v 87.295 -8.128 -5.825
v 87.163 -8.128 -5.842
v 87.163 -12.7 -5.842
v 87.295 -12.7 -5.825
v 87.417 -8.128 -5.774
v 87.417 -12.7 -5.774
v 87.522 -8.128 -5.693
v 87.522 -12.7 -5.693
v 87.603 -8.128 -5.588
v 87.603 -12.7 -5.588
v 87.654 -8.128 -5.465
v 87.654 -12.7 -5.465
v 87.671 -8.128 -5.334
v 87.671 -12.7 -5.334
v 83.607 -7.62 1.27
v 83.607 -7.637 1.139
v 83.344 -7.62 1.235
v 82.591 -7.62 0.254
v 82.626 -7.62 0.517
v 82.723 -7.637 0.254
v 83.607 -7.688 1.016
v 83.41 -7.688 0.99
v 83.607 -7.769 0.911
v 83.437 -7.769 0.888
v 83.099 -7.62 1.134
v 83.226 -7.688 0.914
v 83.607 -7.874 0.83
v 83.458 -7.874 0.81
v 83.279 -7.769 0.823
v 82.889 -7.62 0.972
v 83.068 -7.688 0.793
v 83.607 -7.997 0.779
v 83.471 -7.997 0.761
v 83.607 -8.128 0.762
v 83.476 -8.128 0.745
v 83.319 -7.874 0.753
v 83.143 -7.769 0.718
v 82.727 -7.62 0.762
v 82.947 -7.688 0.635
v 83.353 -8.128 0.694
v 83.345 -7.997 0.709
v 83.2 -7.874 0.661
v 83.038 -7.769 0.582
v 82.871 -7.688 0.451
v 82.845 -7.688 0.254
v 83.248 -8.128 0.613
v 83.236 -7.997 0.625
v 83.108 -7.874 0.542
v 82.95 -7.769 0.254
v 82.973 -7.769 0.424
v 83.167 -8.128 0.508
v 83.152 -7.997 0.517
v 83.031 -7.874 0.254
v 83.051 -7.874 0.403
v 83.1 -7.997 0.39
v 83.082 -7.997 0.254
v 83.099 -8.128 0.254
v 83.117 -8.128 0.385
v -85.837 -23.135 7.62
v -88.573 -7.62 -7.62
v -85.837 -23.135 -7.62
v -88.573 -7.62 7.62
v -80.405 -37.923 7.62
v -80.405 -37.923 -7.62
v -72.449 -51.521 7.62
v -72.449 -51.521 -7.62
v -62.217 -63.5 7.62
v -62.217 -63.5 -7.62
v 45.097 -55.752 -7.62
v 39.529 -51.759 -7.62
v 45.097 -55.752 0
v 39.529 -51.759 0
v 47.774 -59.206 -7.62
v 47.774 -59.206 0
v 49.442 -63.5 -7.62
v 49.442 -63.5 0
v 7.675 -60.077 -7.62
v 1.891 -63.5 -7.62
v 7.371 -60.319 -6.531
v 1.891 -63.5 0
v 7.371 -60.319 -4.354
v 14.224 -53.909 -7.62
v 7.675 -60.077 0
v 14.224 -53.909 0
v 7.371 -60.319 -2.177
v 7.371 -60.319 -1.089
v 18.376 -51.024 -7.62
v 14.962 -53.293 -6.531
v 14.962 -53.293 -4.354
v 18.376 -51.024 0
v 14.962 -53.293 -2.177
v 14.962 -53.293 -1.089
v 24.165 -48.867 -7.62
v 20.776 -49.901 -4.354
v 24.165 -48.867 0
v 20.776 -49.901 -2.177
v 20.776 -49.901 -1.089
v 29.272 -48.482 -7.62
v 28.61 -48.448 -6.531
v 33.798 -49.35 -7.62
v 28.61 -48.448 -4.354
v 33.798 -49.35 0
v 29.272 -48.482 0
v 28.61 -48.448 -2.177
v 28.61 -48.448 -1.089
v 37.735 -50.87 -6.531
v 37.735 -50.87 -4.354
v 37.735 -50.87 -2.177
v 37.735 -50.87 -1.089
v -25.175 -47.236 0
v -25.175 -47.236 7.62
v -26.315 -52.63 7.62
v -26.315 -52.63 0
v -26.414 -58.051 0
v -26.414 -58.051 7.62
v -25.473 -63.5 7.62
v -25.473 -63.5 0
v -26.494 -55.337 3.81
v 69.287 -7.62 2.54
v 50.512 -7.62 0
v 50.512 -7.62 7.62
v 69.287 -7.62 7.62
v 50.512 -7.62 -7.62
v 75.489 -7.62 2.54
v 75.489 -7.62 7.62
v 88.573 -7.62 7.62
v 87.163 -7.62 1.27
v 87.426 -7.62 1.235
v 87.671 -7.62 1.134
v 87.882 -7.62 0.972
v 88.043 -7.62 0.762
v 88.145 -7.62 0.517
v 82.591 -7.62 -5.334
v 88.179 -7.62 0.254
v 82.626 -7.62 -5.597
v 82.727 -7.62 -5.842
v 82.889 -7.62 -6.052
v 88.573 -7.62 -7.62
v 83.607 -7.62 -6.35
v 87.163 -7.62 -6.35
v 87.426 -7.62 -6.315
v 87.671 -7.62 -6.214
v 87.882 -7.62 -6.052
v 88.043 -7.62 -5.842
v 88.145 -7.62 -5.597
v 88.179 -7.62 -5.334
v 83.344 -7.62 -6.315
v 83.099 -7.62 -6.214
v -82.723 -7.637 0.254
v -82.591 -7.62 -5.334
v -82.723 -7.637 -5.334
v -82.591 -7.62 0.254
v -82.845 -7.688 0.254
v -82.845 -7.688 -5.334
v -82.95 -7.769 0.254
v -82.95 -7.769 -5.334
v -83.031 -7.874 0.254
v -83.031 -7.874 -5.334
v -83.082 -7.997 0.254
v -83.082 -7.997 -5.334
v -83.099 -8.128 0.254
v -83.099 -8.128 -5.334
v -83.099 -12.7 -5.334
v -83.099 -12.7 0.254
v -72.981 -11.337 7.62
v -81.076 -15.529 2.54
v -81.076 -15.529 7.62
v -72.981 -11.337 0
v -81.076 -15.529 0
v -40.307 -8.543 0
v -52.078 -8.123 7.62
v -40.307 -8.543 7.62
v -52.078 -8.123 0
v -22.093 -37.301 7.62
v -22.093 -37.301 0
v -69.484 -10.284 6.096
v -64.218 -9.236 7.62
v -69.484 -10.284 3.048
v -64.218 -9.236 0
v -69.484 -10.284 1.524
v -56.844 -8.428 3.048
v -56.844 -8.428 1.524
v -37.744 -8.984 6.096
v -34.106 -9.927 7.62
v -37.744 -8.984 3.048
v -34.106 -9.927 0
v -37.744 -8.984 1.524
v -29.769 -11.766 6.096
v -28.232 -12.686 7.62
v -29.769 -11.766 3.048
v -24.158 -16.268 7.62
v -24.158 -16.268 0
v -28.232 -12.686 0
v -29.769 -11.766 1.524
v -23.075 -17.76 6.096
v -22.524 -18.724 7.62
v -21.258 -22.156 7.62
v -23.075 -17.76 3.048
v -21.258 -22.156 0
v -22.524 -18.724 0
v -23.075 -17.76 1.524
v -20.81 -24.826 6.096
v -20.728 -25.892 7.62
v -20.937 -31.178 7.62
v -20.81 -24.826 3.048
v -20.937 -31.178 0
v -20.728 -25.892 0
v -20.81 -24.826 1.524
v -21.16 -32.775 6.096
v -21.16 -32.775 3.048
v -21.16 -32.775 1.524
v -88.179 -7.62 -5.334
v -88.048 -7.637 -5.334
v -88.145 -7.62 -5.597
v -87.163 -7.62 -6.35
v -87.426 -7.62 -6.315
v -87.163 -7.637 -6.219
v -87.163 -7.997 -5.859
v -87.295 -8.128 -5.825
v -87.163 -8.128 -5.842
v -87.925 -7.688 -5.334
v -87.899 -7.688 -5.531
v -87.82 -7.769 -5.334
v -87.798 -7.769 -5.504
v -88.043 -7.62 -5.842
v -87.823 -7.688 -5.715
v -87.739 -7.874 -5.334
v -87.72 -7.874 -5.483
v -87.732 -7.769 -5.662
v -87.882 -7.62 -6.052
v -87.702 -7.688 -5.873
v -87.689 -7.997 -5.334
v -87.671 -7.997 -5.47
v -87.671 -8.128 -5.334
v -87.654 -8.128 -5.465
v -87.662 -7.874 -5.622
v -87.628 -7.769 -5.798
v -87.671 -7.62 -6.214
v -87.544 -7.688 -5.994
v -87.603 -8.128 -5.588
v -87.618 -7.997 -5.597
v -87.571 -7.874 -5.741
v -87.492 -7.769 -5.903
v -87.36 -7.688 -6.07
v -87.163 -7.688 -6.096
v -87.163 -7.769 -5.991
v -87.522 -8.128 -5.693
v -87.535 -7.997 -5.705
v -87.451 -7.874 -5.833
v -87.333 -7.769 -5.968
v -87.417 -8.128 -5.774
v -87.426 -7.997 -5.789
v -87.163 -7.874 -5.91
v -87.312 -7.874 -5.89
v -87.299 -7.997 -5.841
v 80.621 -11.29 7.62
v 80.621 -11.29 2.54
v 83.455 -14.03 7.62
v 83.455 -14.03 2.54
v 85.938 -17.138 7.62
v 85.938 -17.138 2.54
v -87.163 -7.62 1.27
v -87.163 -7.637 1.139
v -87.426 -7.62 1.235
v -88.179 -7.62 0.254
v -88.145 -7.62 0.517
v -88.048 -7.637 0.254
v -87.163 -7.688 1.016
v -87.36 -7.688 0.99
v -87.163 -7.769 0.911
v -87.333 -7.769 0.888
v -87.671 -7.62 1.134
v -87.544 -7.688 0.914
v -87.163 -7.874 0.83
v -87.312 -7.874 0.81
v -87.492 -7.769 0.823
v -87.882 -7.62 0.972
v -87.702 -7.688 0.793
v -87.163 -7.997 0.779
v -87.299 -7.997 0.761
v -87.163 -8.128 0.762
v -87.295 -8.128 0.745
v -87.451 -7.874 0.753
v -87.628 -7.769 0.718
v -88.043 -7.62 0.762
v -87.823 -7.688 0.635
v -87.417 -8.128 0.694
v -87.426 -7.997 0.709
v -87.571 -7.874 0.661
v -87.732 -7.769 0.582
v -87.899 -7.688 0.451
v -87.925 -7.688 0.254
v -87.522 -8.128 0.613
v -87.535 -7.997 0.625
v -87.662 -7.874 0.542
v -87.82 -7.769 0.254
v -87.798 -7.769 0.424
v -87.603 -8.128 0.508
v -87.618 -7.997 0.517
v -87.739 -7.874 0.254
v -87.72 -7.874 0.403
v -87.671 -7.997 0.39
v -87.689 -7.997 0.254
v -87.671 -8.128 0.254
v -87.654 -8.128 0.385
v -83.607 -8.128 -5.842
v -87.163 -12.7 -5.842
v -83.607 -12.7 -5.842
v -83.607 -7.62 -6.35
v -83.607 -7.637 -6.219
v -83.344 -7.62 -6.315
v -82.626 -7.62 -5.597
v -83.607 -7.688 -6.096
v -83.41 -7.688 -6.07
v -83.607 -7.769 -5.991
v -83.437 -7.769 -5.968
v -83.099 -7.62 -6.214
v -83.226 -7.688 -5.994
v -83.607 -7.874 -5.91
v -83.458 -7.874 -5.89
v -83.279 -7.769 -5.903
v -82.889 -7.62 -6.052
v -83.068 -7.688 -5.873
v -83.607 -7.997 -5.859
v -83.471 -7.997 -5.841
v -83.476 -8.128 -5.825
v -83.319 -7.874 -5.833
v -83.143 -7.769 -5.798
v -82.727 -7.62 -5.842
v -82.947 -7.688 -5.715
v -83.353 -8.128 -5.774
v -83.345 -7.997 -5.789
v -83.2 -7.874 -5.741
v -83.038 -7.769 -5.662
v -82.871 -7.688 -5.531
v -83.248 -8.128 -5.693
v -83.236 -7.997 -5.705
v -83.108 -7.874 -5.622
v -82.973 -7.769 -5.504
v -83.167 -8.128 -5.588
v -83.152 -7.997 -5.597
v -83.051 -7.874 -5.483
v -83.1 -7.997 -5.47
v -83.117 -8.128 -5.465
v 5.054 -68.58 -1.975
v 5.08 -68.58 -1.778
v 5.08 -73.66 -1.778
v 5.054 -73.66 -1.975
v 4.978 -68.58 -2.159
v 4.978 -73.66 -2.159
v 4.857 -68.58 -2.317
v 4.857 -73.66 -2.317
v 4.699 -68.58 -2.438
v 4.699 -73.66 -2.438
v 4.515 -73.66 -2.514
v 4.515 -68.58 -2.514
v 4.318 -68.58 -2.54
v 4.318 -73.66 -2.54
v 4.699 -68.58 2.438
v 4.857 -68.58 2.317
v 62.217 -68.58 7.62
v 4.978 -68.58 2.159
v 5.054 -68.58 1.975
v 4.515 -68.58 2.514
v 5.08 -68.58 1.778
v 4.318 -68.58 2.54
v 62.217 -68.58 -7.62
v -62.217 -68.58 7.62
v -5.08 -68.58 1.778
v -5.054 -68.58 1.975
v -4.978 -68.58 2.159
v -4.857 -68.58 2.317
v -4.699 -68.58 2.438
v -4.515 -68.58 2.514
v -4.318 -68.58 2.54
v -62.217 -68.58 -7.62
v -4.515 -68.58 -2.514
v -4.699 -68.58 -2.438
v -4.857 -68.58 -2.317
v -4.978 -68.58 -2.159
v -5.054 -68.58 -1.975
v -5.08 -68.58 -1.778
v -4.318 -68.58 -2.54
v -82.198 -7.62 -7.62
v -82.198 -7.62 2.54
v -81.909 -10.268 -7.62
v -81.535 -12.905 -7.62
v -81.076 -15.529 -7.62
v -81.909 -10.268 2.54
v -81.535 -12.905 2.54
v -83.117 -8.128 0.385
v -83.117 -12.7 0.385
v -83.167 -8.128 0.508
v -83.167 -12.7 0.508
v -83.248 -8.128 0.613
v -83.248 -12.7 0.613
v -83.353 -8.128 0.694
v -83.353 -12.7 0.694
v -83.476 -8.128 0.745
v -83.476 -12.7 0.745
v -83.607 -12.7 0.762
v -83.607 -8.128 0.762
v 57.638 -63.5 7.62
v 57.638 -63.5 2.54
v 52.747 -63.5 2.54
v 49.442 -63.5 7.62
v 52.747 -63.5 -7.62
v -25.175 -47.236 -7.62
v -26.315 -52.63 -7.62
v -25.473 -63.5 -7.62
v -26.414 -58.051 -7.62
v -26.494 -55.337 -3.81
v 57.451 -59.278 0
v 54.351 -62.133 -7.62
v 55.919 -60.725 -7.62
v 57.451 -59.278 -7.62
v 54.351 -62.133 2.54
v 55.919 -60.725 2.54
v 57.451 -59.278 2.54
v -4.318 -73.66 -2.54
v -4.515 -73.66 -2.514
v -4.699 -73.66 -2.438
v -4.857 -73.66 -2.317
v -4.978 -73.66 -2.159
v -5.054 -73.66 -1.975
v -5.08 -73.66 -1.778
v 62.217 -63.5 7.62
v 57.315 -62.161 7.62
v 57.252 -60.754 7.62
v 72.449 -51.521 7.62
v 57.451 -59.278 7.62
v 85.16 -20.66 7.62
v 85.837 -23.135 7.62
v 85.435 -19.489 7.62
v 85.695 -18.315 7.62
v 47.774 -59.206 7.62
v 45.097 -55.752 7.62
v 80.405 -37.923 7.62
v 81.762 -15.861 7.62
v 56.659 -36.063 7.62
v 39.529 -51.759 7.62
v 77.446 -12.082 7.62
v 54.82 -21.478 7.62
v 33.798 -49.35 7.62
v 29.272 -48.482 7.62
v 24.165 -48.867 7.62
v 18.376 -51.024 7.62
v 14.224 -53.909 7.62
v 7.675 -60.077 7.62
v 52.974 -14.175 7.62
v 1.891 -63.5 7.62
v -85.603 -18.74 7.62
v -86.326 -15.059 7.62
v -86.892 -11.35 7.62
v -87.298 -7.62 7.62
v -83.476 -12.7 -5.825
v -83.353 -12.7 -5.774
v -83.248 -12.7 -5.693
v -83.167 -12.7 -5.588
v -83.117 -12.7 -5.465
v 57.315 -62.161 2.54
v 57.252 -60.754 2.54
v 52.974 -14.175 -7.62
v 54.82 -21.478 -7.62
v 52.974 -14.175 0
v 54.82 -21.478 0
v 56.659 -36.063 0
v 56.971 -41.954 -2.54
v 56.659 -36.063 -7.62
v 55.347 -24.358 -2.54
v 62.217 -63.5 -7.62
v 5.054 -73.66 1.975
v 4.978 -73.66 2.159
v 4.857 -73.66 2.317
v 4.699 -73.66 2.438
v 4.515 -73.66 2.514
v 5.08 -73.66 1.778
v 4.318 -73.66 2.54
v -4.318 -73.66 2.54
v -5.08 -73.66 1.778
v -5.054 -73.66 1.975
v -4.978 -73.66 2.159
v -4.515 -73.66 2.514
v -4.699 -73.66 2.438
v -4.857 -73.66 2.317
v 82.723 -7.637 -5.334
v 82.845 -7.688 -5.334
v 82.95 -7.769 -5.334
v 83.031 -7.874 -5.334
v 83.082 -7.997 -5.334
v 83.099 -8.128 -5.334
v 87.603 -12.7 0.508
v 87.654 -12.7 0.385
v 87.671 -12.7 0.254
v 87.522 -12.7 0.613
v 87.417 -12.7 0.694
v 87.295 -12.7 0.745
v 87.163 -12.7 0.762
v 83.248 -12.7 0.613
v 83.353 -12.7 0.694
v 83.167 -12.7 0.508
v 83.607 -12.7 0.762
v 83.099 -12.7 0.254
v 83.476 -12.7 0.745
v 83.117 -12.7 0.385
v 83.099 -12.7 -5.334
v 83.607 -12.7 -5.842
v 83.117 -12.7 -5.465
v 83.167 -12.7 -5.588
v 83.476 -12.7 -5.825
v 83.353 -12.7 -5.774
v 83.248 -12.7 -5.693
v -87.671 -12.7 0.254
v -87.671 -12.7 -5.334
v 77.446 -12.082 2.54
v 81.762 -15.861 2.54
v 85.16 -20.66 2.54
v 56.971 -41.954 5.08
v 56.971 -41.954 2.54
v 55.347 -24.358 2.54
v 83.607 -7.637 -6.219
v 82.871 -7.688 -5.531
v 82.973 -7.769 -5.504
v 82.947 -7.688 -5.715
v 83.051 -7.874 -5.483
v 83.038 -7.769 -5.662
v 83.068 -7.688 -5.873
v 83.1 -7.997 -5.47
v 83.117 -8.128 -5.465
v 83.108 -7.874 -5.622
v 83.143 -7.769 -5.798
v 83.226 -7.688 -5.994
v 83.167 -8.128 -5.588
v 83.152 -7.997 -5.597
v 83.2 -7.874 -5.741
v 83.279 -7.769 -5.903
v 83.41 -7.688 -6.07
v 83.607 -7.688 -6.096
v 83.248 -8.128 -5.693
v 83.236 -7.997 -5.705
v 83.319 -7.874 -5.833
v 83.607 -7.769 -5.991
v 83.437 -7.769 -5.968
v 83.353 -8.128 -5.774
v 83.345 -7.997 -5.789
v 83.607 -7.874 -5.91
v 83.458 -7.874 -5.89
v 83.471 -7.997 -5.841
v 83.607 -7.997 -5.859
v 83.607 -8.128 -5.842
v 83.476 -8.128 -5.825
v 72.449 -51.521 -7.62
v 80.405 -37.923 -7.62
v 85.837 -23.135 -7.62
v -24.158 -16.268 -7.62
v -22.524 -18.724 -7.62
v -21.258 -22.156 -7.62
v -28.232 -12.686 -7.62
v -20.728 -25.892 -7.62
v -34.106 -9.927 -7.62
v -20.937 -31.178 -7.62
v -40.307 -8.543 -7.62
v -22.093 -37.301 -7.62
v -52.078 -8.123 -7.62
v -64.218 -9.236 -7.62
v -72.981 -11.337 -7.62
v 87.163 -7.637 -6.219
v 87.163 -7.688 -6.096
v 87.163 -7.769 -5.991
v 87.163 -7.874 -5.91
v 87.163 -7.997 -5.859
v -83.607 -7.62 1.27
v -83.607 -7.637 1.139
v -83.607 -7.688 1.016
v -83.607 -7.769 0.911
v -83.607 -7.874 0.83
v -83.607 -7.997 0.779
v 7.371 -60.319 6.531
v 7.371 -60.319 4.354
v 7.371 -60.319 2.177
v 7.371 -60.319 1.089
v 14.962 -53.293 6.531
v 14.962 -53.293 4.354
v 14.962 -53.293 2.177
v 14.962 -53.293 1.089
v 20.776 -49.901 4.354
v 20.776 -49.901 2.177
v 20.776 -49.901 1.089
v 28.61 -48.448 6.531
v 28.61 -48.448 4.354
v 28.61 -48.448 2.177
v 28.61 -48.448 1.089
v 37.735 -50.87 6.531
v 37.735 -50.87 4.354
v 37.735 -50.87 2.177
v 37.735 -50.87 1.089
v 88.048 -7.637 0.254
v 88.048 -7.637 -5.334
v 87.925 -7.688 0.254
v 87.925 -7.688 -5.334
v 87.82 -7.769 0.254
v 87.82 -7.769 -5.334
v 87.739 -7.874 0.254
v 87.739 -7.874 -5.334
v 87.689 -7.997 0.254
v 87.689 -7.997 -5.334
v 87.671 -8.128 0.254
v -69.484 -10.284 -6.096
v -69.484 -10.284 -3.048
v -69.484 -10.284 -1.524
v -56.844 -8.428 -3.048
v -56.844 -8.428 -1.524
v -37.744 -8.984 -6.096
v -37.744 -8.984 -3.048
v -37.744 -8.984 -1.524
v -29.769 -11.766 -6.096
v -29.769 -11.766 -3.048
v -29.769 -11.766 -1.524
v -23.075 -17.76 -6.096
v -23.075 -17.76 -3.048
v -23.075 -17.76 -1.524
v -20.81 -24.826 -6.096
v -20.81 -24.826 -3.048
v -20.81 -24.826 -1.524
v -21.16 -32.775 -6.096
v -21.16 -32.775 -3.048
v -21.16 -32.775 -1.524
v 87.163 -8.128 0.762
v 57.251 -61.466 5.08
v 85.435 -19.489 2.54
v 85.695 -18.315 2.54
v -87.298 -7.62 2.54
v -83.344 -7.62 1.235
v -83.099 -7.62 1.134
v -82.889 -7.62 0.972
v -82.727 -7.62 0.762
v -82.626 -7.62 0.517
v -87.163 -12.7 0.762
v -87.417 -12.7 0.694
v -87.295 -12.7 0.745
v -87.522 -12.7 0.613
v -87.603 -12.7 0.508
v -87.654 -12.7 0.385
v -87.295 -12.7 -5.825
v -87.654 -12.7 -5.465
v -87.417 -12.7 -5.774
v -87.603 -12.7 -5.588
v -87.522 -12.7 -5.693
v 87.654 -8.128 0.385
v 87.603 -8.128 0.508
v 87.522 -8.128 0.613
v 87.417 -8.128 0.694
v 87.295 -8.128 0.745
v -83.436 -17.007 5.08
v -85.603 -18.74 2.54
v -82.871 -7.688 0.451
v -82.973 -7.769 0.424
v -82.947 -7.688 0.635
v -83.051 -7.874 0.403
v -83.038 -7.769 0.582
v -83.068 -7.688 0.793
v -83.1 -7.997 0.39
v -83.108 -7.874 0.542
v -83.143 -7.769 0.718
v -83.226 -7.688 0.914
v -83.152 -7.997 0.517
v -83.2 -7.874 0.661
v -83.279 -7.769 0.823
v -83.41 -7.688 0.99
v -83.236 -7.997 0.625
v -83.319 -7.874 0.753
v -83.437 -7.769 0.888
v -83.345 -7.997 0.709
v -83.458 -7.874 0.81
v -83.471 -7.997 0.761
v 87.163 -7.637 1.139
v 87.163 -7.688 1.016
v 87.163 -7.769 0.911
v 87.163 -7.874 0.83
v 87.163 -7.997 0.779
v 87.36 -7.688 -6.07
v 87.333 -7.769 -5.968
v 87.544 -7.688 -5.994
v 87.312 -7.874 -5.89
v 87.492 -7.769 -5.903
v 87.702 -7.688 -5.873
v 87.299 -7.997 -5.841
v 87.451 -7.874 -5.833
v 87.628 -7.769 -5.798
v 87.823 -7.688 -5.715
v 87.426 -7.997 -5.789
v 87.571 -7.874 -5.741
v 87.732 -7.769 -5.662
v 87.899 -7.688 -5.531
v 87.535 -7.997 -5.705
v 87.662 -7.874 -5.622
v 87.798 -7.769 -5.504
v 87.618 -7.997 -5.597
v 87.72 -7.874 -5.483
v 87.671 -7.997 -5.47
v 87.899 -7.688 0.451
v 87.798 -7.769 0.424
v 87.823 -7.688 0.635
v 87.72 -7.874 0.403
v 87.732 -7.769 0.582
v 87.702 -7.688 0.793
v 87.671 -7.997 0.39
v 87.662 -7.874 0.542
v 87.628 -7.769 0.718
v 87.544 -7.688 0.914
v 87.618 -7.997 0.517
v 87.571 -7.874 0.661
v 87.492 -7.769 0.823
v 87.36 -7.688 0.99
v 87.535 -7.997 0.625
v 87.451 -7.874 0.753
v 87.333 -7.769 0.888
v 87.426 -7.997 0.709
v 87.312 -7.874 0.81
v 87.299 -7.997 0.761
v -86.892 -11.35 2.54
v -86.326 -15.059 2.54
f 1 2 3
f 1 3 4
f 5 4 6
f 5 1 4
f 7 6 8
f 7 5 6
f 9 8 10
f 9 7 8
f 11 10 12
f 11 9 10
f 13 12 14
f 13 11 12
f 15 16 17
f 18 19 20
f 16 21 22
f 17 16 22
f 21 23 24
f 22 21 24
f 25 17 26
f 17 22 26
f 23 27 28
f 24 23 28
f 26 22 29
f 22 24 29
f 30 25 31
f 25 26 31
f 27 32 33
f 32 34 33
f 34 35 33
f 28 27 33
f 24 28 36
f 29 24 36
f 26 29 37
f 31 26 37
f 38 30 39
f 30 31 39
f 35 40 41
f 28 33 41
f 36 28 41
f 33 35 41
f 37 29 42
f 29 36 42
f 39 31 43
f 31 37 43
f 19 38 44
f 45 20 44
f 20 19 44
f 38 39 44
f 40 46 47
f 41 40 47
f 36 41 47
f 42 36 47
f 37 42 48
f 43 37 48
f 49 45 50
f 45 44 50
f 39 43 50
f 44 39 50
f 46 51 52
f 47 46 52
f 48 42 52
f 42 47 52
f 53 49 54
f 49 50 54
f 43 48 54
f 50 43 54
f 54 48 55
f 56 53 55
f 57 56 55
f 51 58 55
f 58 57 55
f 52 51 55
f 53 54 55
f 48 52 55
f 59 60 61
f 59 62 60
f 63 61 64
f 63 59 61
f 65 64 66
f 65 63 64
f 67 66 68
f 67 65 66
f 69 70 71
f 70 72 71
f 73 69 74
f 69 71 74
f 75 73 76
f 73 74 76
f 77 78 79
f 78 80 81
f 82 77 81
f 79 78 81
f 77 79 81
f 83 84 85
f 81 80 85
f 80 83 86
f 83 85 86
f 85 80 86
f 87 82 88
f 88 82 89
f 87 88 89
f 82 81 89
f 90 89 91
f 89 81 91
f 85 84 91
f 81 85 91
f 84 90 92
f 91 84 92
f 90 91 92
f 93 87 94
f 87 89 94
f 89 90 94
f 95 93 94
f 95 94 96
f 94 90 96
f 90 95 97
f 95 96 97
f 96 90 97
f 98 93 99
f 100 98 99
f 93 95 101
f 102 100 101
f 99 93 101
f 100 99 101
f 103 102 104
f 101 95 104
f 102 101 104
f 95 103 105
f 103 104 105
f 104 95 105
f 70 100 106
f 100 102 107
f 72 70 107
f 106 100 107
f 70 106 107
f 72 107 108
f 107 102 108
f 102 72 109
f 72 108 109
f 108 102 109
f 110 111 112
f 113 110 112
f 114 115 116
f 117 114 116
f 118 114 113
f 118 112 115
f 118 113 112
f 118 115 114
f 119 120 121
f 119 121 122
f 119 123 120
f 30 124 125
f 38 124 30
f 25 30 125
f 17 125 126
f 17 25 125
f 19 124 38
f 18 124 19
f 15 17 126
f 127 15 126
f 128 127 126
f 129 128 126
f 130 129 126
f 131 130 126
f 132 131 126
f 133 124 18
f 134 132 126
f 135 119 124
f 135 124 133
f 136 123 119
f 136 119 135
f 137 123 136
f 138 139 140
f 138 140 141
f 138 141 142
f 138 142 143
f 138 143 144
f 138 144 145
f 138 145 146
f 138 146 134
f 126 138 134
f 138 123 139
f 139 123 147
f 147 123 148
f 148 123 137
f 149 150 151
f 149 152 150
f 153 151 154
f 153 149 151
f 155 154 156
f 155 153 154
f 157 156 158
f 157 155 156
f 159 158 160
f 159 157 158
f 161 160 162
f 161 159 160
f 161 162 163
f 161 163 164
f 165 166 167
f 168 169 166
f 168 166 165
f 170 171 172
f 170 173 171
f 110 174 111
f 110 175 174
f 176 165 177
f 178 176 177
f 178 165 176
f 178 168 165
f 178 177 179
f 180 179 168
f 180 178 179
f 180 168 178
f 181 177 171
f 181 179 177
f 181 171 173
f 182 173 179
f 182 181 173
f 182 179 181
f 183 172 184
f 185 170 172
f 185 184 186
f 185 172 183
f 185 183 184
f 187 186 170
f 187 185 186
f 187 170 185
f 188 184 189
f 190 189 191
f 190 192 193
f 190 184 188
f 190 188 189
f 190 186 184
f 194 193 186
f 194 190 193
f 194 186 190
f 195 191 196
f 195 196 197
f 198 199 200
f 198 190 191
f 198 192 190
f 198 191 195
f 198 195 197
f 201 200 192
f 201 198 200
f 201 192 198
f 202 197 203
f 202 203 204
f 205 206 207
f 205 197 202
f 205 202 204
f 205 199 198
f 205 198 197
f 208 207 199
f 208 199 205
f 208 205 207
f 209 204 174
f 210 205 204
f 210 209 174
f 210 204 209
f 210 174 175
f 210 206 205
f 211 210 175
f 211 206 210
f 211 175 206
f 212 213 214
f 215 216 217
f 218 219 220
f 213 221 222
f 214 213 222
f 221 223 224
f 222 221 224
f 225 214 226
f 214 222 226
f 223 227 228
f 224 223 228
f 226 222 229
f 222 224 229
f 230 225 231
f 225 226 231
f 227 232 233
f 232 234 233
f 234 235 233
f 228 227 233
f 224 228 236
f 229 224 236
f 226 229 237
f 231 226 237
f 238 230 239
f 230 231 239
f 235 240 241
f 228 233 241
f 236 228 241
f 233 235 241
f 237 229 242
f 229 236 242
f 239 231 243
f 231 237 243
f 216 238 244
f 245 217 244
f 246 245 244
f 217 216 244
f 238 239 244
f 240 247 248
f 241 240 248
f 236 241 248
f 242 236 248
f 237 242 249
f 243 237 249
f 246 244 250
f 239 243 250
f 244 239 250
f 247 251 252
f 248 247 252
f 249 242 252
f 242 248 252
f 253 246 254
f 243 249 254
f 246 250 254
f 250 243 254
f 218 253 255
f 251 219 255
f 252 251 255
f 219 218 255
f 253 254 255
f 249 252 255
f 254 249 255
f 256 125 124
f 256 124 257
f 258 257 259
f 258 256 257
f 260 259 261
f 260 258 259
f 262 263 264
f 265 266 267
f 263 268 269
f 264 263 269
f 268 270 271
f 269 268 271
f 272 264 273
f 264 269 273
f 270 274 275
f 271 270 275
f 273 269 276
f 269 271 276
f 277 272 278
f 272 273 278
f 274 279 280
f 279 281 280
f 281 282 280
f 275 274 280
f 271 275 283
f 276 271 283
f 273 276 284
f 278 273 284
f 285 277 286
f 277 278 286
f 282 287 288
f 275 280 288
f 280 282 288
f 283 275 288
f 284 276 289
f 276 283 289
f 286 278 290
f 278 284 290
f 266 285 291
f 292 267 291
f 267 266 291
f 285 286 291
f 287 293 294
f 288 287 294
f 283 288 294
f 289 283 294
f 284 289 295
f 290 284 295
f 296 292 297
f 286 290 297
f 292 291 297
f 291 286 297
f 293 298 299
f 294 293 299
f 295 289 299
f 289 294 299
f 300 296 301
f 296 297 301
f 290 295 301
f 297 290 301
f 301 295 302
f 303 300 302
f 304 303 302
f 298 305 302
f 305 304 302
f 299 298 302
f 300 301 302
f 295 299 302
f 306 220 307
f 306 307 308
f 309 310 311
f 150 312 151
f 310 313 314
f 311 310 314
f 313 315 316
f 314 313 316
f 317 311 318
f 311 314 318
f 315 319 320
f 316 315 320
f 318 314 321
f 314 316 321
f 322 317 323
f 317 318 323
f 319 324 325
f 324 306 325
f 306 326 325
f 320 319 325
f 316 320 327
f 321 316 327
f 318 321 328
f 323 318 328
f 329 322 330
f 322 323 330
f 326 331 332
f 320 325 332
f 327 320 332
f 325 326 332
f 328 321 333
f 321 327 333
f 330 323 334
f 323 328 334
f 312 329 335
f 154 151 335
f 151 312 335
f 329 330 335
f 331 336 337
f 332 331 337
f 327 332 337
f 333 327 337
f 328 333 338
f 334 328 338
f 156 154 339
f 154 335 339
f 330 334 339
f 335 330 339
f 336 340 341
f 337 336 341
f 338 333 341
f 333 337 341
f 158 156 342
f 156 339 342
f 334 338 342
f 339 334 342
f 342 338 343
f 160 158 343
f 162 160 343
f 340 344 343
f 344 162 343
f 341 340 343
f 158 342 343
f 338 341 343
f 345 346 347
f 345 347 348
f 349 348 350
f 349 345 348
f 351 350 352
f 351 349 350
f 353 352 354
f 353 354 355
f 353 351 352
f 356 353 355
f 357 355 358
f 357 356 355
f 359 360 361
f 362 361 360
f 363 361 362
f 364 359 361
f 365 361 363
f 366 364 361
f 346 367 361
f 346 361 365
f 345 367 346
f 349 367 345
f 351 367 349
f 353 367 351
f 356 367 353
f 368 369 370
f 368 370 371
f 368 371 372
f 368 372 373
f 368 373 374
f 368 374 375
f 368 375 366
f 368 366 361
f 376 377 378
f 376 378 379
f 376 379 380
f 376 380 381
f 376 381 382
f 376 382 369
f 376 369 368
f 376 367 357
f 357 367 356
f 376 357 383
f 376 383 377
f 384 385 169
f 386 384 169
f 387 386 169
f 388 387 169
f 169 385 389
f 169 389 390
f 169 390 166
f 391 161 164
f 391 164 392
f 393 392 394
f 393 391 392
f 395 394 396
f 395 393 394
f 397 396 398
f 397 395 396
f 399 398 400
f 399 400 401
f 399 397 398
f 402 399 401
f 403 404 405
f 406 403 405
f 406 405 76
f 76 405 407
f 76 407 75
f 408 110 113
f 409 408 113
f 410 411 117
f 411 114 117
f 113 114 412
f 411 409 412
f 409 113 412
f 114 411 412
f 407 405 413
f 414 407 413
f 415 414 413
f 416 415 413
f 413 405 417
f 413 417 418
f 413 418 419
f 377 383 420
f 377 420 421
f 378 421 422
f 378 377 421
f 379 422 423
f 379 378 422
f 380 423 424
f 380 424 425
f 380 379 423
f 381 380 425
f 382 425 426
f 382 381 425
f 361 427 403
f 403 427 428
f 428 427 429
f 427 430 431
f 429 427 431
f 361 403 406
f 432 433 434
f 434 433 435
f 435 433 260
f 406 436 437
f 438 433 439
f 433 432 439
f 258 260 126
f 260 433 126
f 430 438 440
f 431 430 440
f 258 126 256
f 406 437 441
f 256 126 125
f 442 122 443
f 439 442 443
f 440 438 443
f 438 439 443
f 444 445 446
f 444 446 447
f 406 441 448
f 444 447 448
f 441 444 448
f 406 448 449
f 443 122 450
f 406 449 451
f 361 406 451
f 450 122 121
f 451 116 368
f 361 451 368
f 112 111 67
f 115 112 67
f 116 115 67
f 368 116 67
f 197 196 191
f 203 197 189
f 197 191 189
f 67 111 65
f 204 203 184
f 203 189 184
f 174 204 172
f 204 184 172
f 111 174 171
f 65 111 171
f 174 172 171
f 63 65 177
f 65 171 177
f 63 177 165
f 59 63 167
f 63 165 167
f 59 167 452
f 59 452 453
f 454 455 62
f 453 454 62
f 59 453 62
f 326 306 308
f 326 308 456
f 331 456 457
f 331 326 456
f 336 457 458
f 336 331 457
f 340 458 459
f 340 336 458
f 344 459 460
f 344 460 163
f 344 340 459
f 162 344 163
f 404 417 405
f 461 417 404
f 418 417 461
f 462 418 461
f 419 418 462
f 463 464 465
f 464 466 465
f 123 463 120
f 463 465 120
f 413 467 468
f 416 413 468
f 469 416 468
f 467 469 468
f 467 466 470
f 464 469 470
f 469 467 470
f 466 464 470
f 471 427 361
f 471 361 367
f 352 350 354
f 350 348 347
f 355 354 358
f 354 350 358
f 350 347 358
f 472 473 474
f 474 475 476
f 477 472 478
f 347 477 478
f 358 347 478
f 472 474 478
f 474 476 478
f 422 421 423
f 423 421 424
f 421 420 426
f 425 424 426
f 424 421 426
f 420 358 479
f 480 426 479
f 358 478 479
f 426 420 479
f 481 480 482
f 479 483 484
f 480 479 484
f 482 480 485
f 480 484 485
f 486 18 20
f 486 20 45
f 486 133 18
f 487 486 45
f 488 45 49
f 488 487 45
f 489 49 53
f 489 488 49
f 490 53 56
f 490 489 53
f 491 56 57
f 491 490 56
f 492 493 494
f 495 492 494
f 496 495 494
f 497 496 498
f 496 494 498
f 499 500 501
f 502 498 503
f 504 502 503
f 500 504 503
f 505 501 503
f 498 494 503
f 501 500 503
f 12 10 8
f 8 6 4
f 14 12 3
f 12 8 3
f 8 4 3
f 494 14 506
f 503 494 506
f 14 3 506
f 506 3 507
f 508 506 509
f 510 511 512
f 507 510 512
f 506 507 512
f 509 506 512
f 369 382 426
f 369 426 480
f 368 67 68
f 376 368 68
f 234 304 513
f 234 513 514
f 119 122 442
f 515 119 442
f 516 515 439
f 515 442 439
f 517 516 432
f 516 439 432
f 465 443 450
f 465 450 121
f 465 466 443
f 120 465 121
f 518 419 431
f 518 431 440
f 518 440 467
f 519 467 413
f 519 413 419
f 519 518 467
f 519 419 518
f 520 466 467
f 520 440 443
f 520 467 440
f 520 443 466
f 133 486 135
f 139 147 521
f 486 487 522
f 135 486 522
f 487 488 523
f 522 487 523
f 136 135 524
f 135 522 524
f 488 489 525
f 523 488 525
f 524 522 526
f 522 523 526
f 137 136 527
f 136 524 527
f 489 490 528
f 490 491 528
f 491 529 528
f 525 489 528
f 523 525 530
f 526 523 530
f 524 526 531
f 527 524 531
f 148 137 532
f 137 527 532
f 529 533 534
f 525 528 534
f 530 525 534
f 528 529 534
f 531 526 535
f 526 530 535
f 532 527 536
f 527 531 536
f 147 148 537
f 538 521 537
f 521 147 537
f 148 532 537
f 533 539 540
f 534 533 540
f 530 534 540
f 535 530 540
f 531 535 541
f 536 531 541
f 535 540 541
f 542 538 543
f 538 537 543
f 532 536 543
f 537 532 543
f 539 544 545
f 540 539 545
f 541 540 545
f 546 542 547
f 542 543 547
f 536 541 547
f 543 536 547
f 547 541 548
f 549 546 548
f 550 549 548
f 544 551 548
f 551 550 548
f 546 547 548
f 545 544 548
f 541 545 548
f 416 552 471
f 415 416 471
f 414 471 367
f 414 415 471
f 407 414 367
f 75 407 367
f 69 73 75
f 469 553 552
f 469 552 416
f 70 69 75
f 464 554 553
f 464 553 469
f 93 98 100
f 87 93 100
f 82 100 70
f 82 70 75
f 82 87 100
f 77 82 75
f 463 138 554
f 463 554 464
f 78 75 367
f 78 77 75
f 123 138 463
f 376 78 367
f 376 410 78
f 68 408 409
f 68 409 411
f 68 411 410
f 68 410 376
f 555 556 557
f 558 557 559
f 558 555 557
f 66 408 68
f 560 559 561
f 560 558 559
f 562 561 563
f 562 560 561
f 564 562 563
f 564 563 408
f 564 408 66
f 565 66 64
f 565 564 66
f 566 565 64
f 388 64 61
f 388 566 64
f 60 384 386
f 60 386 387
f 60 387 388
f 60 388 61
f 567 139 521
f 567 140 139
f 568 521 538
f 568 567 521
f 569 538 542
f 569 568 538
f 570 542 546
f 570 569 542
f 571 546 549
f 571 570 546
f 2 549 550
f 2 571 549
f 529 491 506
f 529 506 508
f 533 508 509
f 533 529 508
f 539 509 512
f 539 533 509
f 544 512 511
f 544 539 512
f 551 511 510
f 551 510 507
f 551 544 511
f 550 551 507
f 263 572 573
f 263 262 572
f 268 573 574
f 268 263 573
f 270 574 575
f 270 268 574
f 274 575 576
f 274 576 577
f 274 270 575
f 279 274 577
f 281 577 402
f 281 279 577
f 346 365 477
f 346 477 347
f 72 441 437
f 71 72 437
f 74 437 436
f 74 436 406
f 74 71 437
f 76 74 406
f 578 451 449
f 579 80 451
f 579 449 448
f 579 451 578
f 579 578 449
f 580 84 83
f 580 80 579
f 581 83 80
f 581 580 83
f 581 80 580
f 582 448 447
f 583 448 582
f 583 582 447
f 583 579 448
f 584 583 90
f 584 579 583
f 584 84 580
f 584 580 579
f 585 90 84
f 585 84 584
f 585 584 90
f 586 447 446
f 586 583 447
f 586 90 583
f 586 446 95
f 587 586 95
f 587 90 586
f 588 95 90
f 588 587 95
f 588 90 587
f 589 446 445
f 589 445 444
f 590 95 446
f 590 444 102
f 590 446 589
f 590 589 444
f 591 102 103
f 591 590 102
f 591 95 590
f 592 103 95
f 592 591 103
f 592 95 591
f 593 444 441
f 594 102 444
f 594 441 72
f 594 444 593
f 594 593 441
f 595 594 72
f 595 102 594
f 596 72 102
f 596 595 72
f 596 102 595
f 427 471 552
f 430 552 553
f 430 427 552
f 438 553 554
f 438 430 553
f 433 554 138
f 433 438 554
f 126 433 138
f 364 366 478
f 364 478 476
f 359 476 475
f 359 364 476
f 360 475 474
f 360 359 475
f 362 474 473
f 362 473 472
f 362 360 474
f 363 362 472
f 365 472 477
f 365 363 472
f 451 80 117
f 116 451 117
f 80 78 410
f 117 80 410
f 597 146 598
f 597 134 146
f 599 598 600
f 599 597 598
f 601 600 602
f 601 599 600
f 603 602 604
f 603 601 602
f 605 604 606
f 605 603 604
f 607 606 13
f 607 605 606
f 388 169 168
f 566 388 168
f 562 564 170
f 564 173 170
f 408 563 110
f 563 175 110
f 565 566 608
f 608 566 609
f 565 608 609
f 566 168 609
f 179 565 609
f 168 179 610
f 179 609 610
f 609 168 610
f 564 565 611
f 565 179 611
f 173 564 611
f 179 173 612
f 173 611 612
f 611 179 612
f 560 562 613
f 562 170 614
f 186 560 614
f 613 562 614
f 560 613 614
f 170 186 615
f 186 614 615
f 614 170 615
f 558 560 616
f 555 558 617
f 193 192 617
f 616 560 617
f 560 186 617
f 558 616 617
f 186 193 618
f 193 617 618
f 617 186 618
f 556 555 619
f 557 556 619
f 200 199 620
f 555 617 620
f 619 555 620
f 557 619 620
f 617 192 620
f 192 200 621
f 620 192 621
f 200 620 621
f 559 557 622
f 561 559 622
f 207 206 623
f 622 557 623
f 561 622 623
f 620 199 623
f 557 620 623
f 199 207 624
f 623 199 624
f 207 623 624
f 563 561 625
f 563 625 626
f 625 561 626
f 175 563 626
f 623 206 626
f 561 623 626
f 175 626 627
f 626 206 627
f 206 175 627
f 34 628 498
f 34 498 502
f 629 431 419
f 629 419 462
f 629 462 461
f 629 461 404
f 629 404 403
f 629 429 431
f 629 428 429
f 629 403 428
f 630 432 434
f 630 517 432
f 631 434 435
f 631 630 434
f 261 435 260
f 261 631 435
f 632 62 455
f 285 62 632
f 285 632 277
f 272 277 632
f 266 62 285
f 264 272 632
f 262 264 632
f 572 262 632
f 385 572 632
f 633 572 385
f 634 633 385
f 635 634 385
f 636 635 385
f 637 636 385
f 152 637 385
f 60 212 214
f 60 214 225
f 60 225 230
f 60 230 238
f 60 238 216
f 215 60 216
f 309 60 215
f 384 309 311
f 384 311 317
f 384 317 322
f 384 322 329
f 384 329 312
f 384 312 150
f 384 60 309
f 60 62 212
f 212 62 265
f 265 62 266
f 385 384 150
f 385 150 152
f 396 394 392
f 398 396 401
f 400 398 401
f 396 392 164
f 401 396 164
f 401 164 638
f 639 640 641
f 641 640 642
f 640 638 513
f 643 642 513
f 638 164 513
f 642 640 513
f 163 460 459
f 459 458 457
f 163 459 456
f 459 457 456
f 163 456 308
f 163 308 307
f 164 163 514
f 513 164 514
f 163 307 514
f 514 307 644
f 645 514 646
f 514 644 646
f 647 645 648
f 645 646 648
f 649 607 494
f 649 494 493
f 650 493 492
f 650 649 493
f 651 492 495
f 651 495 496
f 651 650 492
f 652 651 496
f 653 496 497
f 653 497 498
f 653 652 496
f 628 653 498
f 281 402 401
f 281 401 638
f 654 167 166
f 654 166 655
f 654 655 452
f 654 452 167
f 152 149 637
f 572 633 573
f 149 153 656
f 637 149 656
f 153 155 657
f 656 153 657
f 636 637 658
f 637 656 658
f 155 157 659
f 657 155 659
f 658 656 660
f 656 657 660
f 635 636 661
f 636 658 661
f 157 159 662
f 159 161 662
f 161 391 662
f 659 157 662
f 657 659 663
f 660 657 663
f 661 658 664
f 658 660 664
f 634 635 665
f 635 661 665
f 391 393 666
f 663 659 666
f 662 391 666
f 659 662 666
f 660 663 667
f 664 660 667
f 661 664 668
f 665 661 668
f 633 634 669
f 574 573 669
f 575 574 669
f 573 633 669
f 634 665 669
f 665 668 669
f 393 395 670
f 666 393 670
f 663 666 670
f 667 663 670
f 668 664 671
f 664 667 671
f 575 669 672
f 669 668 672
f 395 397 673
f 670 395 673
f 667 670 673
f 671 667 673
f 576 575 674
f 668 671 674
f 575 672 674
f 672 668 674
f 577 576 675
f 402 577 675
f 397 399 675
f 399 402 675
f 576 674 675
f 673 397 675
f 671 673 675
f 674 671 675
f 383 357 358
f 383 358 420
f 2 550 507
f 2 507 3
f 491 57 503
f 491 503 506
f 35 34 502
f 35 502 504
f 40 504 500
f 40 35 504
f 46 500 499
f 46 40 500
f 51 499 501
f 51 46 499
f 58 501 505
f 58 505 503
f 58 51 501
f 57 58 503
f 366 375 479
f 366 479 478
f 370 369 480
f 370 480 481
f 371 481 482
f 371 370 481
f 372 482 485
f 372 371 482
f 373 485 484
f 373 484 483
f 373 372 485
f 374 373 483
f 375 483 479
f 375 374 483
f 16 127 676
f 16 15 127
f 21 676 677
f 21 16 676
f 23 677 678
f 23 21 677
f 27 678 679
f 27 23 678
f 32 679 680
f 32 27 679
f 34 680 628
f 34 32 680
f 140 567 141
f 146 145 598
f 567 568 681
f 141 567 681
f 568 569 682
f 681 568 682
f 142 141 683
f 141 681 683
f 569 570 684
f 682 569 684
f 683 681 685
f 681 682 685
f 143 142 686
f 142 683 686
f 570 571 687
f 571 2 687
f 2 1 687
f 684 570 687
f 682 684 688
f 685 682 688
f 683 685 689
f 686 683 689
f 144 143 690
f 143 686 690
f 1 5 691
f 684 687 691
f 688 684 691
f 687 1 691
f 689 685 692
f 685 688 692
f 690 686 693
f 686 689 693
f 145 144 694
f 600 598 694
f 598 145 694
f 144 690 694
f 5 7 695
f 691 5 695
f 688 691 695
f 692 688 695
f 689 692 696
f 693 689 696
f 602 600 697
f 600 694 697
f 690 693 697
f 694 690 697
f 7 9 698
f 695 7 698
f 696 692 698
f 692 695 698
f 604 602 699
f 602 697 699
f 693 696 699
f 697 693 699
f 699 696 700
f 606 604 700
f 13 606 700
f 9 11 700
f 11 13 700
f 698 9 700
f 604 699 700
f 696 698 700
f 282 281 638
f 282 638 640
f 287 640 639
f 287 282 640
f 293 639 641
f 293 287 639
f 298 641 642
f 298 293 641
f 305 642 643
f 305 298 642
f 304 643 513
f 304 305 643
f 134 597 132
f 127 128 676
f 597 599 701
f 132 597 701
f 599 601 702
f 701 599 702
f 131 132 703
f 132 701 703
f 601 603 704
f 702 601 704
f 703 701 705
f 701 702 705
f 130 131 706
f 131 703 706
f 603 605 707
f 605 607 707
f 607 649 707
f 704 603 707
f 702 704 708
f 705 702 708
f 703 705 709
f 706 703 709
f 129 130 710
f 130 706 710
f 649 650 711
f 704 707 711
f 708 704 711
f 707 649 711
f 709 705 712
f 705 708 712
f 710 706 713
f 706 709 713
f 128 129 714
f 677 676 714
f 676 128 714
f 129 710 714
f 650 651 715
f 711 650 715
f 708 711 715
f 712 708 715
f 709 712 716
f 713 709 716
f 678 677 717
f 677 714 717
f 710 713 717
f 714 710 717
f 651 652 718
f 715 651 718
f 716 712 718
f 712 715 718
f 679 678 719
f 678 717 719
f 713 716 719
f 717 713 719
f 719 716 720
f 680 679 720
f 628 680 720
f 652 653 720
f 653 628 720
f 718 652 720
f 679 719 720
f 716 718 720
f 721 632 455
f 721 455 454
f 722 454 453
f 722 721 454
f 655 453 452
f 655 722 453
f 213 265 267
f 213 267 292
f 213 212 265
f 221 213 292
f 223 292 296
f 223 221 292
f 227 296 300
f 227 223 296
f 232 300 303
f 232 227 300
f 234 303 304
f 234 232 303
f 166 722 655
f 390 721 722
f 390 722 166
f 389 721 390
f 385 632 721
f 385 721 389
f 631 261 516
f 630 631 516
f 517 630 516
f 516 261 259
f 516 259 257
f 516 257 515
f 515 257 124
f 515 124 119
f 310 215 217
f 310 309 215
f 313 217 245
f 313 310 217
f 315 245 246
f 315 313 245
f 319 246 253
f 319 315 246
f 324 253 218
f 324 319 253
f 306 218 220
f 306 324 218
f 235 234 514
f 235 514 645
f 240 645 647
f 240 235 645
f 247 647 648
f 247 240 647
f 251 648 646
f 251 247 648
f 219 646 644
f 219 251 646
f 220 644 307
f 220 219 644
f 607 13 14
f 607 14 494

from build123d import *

# Parameters (mm, degrees)
SKETCH2_R           = 88.9
BOSS_EXTRUDE1_DEPTH = 7.62
CUT_EXTRUDE1_DEPTH  = 5.08
CUT_EXTRUDE2_DEPTH  = 5.08
SKETCH6_R           = 88.9
SKETCH6_R_2         = 87.63
BOSS_EXTRUDE2_DEPTH = 7.62
SKETCH5_W           = 447.85569709
SKETCH5_H           = 96.634651294
CUT_EXTRUDE3_DEPTH  = 132.443466321
CUT_EXTRUDE4_DEPTH  = 5.08
FILLET1_R           = 0.508
FILLET2_R           = 0.508
SKETCH8_W           = 235.469737428
SKETCH8_H           = 63.022782664
CUT_EXTRUDE6_DEPTH  = 30.48
SKETCH11_W          = 124.434078934
SKETCH11_H          = 15.24
BOSS_EXTRUDE3_DEPTH = 5.08
BOSS_EXTRUDE4_DEPTH = 5.08


with BuildPart() as part:
    # Sketch2 → Boss-Extrude1 (new, symmetric)
    with BuildSketch(Plane.XY):
        with Locations(Location((0, 0, 0), (0, 0, 180))):
            Circle(SKETCH2_R)
        with BuildLine():
            ThreePointArc((-82.315247566, -6.2211348), (-81.828164186, -10.892843798), (-81.076160162, -15.529286954))
            add(Edge.make_bspline(
                [(-81.076160162, -15.529286954), (-73.906972416, -10.329566502), (-59.046073895, -8.193381199), (-41.118812884, -7.621785306), (-29.401022662, -11.302114845), (-16.402067506, -22.130924736), (-22.534501322, -39.59705785), (-25.174662603, -47.236332112)],
                knots=[0, 0, 0, 0, 0.276571303, 0.483745751, 0.57530858, 0.672728071, 1, 1, 1, 1], degree=3))
            add(Edge.make_bspline(
                [(-25.174662603, -47.236332112), (-27.78260004, -55.688683624), (-25.255419914, -64.276124819)],
                knots=[0, 0, 0, 1, 1, 1], degree=2))
            add(Edge.make_bspline(
                [(-25.255419914, -64.276124819), (-19.568994185, -66.326395956), (-8.191864865, -67.179069199), (6.698062012, -62.452519029), (13.701149455, -53.656480208), (20.991800731, -49.374990358), (29.14906596, -47.7148715), (41.321609726, -51.605604), (49.118683791, -58.056687878), (49.804799161, -65.833004493)],
                knots=[0, 0, 0, 0, 0.203689327, 0.383928899, 0.501194003, 0.577509121, 0.667833303, 0.774874029, 1, 1, 1, 1], degree=3))
            ThreePointArc((49.804799161, -65.833004493), (53.727997634, -62.672200937), (57.451073953, -59.277960505))
            add(Edge.make_bspline(
                [(57.451073953, -59.277960505), (56.756918153, -39.692420945), (57.937164009, -17.253163459), (46.295557994, 0)],
                knots=[0, 0, 0, 0, 1, 1, 1, 1], degree=3))
            add(Edge.make_bspline(
                [(46.295557994, 0), (29.352418178, 2.160827537), (12.476860977, -1.829953153), (-4.097004325, -4.838743622)],
                knots=[0, 0, 0, 0, 1, 1, 1, 1], degree=3))
            add(Edge.make_bspline(
                [(-4.097004325, -4.838743622), (-9.003253572, -4.538646122), (-9.174496671, 2.827576235), (-6.823743398, 13.979544817), (0.460919685, 29.784330466), (13.972068662, 51.572454476), (27.394543454, 67.53561229), (37.735282985, 73.420371274)],
                knots=[0, 0, 0, 0, 0.104628163, 0.200082966, 0.362713634, 0.636377303, 1, 1, 1, 1], degree=3))
            ThreePointArc((37.735282985, 73.420371274), (31.253924322, 76.40480819), (24.539050502, 78.818383011))
            add(Edge.make_bspline(
                [(24.539050502, 78.818383011), (20.455603408, 74.411727836), (17.564971871, 65.824999318), (9.51286746, 57.448673309), (-6.264292968, 43.842012074), (-22.034432487, 67.881542589), (-34.946297284, 64.774058813)],
                knots=[0, 0, 0, 0, 0.241588619, 0.345090174, 0.475626468, 1, 1, 1, 1], degree=3))
            add(Edge.make_bspline(
                [(-34.946297284, 64.774058813), (-40.534107409, 56.654806295), (-49.826434679, 42.328020188), (-53.897482917, 22.922904088), (-55.122078377, 8.697330529), (-64.97763294, -2.490084084), (-73.627608697, -8.872135806), (-82.315247566, -6.2211348)],
                knots=[0, 0, 0, 0, 0.32342158, 0.539679085, 0.642017351, 0.776511597, 1, 1, 1, 1], degree=3))
        make_face(mode=Mode.SUBTRACT)
    extrude(amount=BOSS_EXTRUDE1_DEPTH, both=True)

    # Sketch3 → Cut-Extrude1 (cut)
    with BuildSketch(Plane.XY.offset(7.62)):
        with BuildLine():
            ThreePointArc((45.031224335, -76.651150251), (52.423489091, -71.798243652), (59.297063103, -66.23494778))
            add(Edge.make_bspline(
                [(57.451073953, -59.277960505), (56.590081261, -63.222807516), (59.297063103, -66.23494778)],
                knots=[0, 0, 0, 1, 1, 1], degree=2))
            ThreePointArc((57.451073953, -59.277960505), (53.727997634, -62.672200937), (49.804799161, -65.833004493))
            add(Edge.make_bspline(
                [(49.804799161, -65.833004493), (50.290836256, -72.182369469), (45.031224335, -76.651150251)],
                knots=[0, 0, 0, 1, 1, 1], degree=2))
        make_face()
        with BuildLine():
            ThreePointArc((-88.68252483, 6.214482268), (-88.635767577, -6.849139077), (-86.675026694, -19.764861438))
            add(Edge.make_bspline(
                [(-81.076160162, -15.529286954), (-84.185623479, -17.238401337), (-86.675026694, -19.764861438)],
                knots=[0, 0, 0, 1, 1, 1], degree=2))
            ThreePointArc((-81.076160162, -15.529286954), (-81.828164186, -10.892843798), (-82.315247566, -6.2211348))
            add(Edge.make_bspline(
                [(-82.315247566, -6.2211348), (-88.132024584, -1.499163565), (-88.68252483, 6.214482268)],
                knots=[0, 0, 0, 1, 1, 1], degree=2))
        make_face()
        with BuildLine():
            ThreePointArc((46.295557994, 75.894211308), (38.302929005, 80.22528049), (29.909783679, 83.717470341))
            add(Edge.make_bspline(
                [(24.539050502, 78.818383011), (26.687958515, 81.902861564), (29.909783679, 83.717470341)],
                knots=[0, 0, 0, 1, 1, 1], degree=2))
            ThreePointArc((24.539050502, 78.818383011), (31.253924322, 76.40480819), (37.735282985, 73.420371274))
            add(Edge.make_bspline(
                [(37.735282985, 73.420371274), (41.692258874, 75.781578849), (46.295557994, 75.894211308)],
                knots=[0, 0, 0, 1, 1, 1], degree=2))
        make_face()
    extrude(amount=-CUT_EXTRUDE1_DEPTH, mode=Mode.SUBTRACT)

    # Sketch4 → Cut-Extrude2 (cut)
    with BuildSketch(Plane.XY.offset(7.62)):
        with BuildLine():
            add(Edge.make_bspline(
                [(47.900635375, -2.546062133), (47.394653083, -1.68578683), (46.860186189, -0.836793698), (46.295557994, 0)],
                knots=[0.951499115, 0.951499115, 0.951499115, 0.951499115, 1, 1, 1, 1], degree=3))
            add(Edge.make_bspline(
                [(46.295557994, 0), (53.13831993, -0.121479856), (68.560923547, -2.55317749), (82.330777435, -11.060245422), (86.920742606, -18.654610819)],
                knots=[0, 0, 0, 0, 0.442007256, 1, 1, 1, 1], degree=3))
            ThreePointArc((86.920742606, -18.654610819), (86.48950366, -20.561511535), (86.016435709, -22.458468066))
            add(Edge.make_bspline(
                [(47.900635375, -2.546062133), (54.105200197, -2.383601891), (68.545991377, -6.411725997), (82.278778054, -13.661239618), (86.016435709, -22.458468066)],
                knots=[0, 0, 0, 0, 0.409341375, 1, 1, 1, 1], degree=3))
        make_face()
        with BuildLine():
            add(Edge.make_bspline(
                [(-25.255419914, -64.276124819), (-24.329796264, -64.609863365), (-23.39490974, -64.901263139), (-22.452232953, -65.15178529)],
                knots=[0, 0, 0, 0, 0.033156093, 0.033156093, 0.033156093, 0.033156093], degree=3))
            add(Edge.make_bspline(
                [(-22.452232953, -65.15178529), (-17.435167734, -76.286545317), (-6.016270367, -83.097855064), (4.238511489, -88.798902135)],
                knots=[0, 0, 0, 0, 1, 1, 1, 1], degree=3))
            ThreePointArc((4.238511489, -88.798902135), (2.435652007, -88.866628153), (0.631789417, -88.897754989))
            add(Edge.make_bspline(
                [(-25.255419914, -64.276124819), (-21.127783836, -75.858222766), (-10.467359196, -84.393639797), (0.631789417, -88.897754989)],
                knots=[0, 0, 0, 0, 1, 1, 1, 1], degree=3))
        make_face()
        with BuildLine():
            add(Edge.make_bspline(
                [(-34.946297284, 64.774058813), (-50.35182607, 67.382365169), (-64.84460315, 60.814368716)],
                knots=[0, 0, 0, 1, 1, 1], degree=2))
            ThreePointArc((-64.84460315, 60.814368716), (-66.672342804, 58.804835729), (-68.43783363, 56.740399435))
            add(Edge.make_bspline(
                [(-35.097283324, 62.444599517), (-52.424851341, 65.607841777), (-68.43783363, 56.740399435)],
                knots=[0, 0, 0, 1, 1, 1], degree=2))
            Line((-35.097283324, 62.444599517), (-34.946297284, 64.774058813))
        make_face()
    extrude(amount=-CUT_EXTRUDE2_DEPTH, mode=Mode.SUBTRACT)

    # Sketch6 → Boss-Extrude2 (add, symmetric)
    with BuildSketch(Plane.XY):
        with Locations(Location((0, 0, 0), (0, 0, 180))):
            Circle(SKETCH6_R)
        Circle(SKETCH6_R_2, mode=Mode.SUBTRACT)
    extrude(amount=BOSS_EXTRUDE2_DEPTH, both=True)

    # Sketch5 → Cut-Extrude3 (cut, through all)
    with BuildSketch(Plane(origin=(0, -7.62, 0), x_dir=(1, 0, 0), z_dir=(0, 1, 0))):
        Rectangle(SKETCH5_W, SKETCH5_H)
    extrude(amount=CUT_EXTRUDE3_DEPTH, mode=Mode.SUBTRACT)

    # Sketch7 → Cut-Extrude4 (cut)
    with BuildSketch(Plane(origin=(0, -7.62, 0), x_dir=(1, 0, 0), z_dir=(0, 1, 0))):
        with BuildLine():
            Line((-87.163190925, 5.842), (-83.607190925, 5.842))
            ThreePointArc((-83.607190925, 5.842), (-83.24798068, 5.693210245), (-83.099190925, 5.334))
            Line((-83.099190925, 5.334), (-83.099190925, -0.254))
            ThreePointArc((-83.099190925, -0.254), (-83.24798068, -0.613210245), (-83.607190925, -0.762))
            Line((-83.607190925, -0.762), (-87.163190925, -0.762))
            ThreePointArc((-87.163190925, -0.762), (-87.522401169, -0.613210245), (-87.671190925, -0.254))
            Line((-87.671190925, -0.254), (-87.671190925, 5.334))
            ThreePointArc((-87.671190925, 5.334), (-87.522401169, 5.693210245), (-87.163190925, 5.842))
        make_face()
        with BuildLine():
            Line((87.163190925, -0.762), (83.607190925, -0.762))
            ThreePointArc((83.607190925, -0.762), (83.24798068, -0.613210245), (83.099190925, -0.254))
            Line((83.099190925, -0.254), (83.099190925, 5.334))
            ThreePointArc((83.099190925, 5.334), (83.24798068, 5.693210245), (83.607190925, 5.842))
            Line((83.607190925, 5.842), (87.163190925, 5.842))
            ThreePointArc((87.163190925, 5.842), (87.522401169, 5.693210245), (87.671190925, 5.334))
            Line((87.671190925, 5.334), (87.671190925, -0.254))
            ThreePointArc((87.671190925, -0.254), (87.522401169, -0.613210245), (87.163190925, -0.762))
        make_face()
    extrude(amount=-CUT_EXTRUDE4_DEPTH, mode=Mode.SUBTRACT)

    # Fillet1
    fillet1_edges = [part.edges().sort_by_distance(p)[0] for p in [
        (-87.522401169, -7.62, 0.613210245),
        (-85.385190925, -7.62, 0.762),
        (-83.24798068, -7.62, 0.613210245),
        (-83.099190925, -7.62, -2.54),
        (-83.24798068, -7.62, -5.693210245),
        (-85.385190925, -7.62, -5.842),
        (-87.522401169, -7.62, -5.693210245),
        (-87.671190925, -7.62, -2.54),
    ]]
    fillet(fillet1_edges, radius=FILLET1_R)

    # Fillet2
    fillet2_edges = [part.edges().sort_by_distance(p)[0] for p in [
        (87.522401169, -7.62, 0.613210245),
        (87.671190925, -7.62, -2.54),
        (87.522401169, -7.62, -5.693210245),
        (85.385190925, -7.62, -5.842),
        (83.24798068, -7.62, -5.693210245),
        (83.099190925, -7.62, -2.54),
        (83.24798068, -7.62, 0.613210245),
        (85.385190925, -7.62, 0.762),
    ]]
    fillet(fillet2_edges, radius=FILLET2_R)

    # Sketch8 → Cut-Extrude6 (cut)
    with BuildSketch(Plane(origin=(0, -63.5, 0), x_dir=(-1, 0, 0), z_dir=(0, -1, 0))):
        with Locations((12.697642911, -4.339889392)):
            Rectangle(SKETCH8_W, SKETCH8_H)
    extrude(amount=CUT_EXTRUDE6_DEPTH, mode=Mode.SUBTRACT)


with BuildPart() as cut_extrude6_piece_1:
    # of the separate pieces the step leaves, piece 1, a body of its own (cut_extrude6_pieces)
    add(part.part.solids().sort_by_distance((-88.572826533, -7.62, -7.62))[0])



with BuildPart() as cut_extrude6_piece_2:
    # of the separate pieces the step leaves, piece 2, a body of its own (cut_extrude6_pieces)
    add(part.part.solids().sort_by_distance((88.179190925, -7.62, 0.254))[0])


with BuildPart() as cut_extrude6_piece_3:
    # of the separate pieces the step leaves, piece 3, a body of its own (cut_extrude6_pieces)
    add(part.part.solids().sort_by_distance((1.891173644, -63.5, -7.62))[0])


with BuildPart() as cut_extrude6_piece_1_1:
    add(cut_extrude6_piece_1.part)

    add(cut_extrude6_piece_2.part)  # Boss-Extrude3 merges Cut-Extrude6 piece 2

    add(cut_extrude6_piece_3.part)  # Boss-Extrude3 merges Cut-Extrude6 piece 3
    # Sketch11 → Boss-Extrude3 (add)
    with BuildSketch(Plane(origin=(0, -63.5, 0), x_dir=(-1, 0, 0), z_dir=(0, -1, 0))):
        Rectangle(SKETCH11_W, SKETCH11_H)
    extrude(amount=BOSS_EXTRUDE3_DEPTH)

    # Sketch12 → Boss-Extrude4 (add)
    with BuildSketch(Plane.XZ.offset(68.58)):
        with BuildLine():
            Line((-4.318, 2.54), (4.318, 2.54))
            ThreePointArc((4.318, 2.54), (4.856815367, 2.316815367), (5.08, 1.778))
            Line((5.08, 1.778), (5.08, -1.778))
            ThreePointArc((5.08, -1.778), (4.856815367, -2.316815367), (4.318, -2.54))
            Line((4.318, -2.54), (-4.318, -2.54))
            ThreePointArc((-4.318, -2.54), (-4.856815367, -2.316815367), (-5.08, -1.778))
            Line((-5.08, -1.778), (-5.08, 1.778))
            ThreePointArc((-5.08, 1.778), (-4.856815367, 2.316815367), (-4.318, 2.54))
        make_face()
    extrude(amount=BOSS_EXTRUDE4_DEPTH)


solid = cut_extrude6_piece_1_1.part
